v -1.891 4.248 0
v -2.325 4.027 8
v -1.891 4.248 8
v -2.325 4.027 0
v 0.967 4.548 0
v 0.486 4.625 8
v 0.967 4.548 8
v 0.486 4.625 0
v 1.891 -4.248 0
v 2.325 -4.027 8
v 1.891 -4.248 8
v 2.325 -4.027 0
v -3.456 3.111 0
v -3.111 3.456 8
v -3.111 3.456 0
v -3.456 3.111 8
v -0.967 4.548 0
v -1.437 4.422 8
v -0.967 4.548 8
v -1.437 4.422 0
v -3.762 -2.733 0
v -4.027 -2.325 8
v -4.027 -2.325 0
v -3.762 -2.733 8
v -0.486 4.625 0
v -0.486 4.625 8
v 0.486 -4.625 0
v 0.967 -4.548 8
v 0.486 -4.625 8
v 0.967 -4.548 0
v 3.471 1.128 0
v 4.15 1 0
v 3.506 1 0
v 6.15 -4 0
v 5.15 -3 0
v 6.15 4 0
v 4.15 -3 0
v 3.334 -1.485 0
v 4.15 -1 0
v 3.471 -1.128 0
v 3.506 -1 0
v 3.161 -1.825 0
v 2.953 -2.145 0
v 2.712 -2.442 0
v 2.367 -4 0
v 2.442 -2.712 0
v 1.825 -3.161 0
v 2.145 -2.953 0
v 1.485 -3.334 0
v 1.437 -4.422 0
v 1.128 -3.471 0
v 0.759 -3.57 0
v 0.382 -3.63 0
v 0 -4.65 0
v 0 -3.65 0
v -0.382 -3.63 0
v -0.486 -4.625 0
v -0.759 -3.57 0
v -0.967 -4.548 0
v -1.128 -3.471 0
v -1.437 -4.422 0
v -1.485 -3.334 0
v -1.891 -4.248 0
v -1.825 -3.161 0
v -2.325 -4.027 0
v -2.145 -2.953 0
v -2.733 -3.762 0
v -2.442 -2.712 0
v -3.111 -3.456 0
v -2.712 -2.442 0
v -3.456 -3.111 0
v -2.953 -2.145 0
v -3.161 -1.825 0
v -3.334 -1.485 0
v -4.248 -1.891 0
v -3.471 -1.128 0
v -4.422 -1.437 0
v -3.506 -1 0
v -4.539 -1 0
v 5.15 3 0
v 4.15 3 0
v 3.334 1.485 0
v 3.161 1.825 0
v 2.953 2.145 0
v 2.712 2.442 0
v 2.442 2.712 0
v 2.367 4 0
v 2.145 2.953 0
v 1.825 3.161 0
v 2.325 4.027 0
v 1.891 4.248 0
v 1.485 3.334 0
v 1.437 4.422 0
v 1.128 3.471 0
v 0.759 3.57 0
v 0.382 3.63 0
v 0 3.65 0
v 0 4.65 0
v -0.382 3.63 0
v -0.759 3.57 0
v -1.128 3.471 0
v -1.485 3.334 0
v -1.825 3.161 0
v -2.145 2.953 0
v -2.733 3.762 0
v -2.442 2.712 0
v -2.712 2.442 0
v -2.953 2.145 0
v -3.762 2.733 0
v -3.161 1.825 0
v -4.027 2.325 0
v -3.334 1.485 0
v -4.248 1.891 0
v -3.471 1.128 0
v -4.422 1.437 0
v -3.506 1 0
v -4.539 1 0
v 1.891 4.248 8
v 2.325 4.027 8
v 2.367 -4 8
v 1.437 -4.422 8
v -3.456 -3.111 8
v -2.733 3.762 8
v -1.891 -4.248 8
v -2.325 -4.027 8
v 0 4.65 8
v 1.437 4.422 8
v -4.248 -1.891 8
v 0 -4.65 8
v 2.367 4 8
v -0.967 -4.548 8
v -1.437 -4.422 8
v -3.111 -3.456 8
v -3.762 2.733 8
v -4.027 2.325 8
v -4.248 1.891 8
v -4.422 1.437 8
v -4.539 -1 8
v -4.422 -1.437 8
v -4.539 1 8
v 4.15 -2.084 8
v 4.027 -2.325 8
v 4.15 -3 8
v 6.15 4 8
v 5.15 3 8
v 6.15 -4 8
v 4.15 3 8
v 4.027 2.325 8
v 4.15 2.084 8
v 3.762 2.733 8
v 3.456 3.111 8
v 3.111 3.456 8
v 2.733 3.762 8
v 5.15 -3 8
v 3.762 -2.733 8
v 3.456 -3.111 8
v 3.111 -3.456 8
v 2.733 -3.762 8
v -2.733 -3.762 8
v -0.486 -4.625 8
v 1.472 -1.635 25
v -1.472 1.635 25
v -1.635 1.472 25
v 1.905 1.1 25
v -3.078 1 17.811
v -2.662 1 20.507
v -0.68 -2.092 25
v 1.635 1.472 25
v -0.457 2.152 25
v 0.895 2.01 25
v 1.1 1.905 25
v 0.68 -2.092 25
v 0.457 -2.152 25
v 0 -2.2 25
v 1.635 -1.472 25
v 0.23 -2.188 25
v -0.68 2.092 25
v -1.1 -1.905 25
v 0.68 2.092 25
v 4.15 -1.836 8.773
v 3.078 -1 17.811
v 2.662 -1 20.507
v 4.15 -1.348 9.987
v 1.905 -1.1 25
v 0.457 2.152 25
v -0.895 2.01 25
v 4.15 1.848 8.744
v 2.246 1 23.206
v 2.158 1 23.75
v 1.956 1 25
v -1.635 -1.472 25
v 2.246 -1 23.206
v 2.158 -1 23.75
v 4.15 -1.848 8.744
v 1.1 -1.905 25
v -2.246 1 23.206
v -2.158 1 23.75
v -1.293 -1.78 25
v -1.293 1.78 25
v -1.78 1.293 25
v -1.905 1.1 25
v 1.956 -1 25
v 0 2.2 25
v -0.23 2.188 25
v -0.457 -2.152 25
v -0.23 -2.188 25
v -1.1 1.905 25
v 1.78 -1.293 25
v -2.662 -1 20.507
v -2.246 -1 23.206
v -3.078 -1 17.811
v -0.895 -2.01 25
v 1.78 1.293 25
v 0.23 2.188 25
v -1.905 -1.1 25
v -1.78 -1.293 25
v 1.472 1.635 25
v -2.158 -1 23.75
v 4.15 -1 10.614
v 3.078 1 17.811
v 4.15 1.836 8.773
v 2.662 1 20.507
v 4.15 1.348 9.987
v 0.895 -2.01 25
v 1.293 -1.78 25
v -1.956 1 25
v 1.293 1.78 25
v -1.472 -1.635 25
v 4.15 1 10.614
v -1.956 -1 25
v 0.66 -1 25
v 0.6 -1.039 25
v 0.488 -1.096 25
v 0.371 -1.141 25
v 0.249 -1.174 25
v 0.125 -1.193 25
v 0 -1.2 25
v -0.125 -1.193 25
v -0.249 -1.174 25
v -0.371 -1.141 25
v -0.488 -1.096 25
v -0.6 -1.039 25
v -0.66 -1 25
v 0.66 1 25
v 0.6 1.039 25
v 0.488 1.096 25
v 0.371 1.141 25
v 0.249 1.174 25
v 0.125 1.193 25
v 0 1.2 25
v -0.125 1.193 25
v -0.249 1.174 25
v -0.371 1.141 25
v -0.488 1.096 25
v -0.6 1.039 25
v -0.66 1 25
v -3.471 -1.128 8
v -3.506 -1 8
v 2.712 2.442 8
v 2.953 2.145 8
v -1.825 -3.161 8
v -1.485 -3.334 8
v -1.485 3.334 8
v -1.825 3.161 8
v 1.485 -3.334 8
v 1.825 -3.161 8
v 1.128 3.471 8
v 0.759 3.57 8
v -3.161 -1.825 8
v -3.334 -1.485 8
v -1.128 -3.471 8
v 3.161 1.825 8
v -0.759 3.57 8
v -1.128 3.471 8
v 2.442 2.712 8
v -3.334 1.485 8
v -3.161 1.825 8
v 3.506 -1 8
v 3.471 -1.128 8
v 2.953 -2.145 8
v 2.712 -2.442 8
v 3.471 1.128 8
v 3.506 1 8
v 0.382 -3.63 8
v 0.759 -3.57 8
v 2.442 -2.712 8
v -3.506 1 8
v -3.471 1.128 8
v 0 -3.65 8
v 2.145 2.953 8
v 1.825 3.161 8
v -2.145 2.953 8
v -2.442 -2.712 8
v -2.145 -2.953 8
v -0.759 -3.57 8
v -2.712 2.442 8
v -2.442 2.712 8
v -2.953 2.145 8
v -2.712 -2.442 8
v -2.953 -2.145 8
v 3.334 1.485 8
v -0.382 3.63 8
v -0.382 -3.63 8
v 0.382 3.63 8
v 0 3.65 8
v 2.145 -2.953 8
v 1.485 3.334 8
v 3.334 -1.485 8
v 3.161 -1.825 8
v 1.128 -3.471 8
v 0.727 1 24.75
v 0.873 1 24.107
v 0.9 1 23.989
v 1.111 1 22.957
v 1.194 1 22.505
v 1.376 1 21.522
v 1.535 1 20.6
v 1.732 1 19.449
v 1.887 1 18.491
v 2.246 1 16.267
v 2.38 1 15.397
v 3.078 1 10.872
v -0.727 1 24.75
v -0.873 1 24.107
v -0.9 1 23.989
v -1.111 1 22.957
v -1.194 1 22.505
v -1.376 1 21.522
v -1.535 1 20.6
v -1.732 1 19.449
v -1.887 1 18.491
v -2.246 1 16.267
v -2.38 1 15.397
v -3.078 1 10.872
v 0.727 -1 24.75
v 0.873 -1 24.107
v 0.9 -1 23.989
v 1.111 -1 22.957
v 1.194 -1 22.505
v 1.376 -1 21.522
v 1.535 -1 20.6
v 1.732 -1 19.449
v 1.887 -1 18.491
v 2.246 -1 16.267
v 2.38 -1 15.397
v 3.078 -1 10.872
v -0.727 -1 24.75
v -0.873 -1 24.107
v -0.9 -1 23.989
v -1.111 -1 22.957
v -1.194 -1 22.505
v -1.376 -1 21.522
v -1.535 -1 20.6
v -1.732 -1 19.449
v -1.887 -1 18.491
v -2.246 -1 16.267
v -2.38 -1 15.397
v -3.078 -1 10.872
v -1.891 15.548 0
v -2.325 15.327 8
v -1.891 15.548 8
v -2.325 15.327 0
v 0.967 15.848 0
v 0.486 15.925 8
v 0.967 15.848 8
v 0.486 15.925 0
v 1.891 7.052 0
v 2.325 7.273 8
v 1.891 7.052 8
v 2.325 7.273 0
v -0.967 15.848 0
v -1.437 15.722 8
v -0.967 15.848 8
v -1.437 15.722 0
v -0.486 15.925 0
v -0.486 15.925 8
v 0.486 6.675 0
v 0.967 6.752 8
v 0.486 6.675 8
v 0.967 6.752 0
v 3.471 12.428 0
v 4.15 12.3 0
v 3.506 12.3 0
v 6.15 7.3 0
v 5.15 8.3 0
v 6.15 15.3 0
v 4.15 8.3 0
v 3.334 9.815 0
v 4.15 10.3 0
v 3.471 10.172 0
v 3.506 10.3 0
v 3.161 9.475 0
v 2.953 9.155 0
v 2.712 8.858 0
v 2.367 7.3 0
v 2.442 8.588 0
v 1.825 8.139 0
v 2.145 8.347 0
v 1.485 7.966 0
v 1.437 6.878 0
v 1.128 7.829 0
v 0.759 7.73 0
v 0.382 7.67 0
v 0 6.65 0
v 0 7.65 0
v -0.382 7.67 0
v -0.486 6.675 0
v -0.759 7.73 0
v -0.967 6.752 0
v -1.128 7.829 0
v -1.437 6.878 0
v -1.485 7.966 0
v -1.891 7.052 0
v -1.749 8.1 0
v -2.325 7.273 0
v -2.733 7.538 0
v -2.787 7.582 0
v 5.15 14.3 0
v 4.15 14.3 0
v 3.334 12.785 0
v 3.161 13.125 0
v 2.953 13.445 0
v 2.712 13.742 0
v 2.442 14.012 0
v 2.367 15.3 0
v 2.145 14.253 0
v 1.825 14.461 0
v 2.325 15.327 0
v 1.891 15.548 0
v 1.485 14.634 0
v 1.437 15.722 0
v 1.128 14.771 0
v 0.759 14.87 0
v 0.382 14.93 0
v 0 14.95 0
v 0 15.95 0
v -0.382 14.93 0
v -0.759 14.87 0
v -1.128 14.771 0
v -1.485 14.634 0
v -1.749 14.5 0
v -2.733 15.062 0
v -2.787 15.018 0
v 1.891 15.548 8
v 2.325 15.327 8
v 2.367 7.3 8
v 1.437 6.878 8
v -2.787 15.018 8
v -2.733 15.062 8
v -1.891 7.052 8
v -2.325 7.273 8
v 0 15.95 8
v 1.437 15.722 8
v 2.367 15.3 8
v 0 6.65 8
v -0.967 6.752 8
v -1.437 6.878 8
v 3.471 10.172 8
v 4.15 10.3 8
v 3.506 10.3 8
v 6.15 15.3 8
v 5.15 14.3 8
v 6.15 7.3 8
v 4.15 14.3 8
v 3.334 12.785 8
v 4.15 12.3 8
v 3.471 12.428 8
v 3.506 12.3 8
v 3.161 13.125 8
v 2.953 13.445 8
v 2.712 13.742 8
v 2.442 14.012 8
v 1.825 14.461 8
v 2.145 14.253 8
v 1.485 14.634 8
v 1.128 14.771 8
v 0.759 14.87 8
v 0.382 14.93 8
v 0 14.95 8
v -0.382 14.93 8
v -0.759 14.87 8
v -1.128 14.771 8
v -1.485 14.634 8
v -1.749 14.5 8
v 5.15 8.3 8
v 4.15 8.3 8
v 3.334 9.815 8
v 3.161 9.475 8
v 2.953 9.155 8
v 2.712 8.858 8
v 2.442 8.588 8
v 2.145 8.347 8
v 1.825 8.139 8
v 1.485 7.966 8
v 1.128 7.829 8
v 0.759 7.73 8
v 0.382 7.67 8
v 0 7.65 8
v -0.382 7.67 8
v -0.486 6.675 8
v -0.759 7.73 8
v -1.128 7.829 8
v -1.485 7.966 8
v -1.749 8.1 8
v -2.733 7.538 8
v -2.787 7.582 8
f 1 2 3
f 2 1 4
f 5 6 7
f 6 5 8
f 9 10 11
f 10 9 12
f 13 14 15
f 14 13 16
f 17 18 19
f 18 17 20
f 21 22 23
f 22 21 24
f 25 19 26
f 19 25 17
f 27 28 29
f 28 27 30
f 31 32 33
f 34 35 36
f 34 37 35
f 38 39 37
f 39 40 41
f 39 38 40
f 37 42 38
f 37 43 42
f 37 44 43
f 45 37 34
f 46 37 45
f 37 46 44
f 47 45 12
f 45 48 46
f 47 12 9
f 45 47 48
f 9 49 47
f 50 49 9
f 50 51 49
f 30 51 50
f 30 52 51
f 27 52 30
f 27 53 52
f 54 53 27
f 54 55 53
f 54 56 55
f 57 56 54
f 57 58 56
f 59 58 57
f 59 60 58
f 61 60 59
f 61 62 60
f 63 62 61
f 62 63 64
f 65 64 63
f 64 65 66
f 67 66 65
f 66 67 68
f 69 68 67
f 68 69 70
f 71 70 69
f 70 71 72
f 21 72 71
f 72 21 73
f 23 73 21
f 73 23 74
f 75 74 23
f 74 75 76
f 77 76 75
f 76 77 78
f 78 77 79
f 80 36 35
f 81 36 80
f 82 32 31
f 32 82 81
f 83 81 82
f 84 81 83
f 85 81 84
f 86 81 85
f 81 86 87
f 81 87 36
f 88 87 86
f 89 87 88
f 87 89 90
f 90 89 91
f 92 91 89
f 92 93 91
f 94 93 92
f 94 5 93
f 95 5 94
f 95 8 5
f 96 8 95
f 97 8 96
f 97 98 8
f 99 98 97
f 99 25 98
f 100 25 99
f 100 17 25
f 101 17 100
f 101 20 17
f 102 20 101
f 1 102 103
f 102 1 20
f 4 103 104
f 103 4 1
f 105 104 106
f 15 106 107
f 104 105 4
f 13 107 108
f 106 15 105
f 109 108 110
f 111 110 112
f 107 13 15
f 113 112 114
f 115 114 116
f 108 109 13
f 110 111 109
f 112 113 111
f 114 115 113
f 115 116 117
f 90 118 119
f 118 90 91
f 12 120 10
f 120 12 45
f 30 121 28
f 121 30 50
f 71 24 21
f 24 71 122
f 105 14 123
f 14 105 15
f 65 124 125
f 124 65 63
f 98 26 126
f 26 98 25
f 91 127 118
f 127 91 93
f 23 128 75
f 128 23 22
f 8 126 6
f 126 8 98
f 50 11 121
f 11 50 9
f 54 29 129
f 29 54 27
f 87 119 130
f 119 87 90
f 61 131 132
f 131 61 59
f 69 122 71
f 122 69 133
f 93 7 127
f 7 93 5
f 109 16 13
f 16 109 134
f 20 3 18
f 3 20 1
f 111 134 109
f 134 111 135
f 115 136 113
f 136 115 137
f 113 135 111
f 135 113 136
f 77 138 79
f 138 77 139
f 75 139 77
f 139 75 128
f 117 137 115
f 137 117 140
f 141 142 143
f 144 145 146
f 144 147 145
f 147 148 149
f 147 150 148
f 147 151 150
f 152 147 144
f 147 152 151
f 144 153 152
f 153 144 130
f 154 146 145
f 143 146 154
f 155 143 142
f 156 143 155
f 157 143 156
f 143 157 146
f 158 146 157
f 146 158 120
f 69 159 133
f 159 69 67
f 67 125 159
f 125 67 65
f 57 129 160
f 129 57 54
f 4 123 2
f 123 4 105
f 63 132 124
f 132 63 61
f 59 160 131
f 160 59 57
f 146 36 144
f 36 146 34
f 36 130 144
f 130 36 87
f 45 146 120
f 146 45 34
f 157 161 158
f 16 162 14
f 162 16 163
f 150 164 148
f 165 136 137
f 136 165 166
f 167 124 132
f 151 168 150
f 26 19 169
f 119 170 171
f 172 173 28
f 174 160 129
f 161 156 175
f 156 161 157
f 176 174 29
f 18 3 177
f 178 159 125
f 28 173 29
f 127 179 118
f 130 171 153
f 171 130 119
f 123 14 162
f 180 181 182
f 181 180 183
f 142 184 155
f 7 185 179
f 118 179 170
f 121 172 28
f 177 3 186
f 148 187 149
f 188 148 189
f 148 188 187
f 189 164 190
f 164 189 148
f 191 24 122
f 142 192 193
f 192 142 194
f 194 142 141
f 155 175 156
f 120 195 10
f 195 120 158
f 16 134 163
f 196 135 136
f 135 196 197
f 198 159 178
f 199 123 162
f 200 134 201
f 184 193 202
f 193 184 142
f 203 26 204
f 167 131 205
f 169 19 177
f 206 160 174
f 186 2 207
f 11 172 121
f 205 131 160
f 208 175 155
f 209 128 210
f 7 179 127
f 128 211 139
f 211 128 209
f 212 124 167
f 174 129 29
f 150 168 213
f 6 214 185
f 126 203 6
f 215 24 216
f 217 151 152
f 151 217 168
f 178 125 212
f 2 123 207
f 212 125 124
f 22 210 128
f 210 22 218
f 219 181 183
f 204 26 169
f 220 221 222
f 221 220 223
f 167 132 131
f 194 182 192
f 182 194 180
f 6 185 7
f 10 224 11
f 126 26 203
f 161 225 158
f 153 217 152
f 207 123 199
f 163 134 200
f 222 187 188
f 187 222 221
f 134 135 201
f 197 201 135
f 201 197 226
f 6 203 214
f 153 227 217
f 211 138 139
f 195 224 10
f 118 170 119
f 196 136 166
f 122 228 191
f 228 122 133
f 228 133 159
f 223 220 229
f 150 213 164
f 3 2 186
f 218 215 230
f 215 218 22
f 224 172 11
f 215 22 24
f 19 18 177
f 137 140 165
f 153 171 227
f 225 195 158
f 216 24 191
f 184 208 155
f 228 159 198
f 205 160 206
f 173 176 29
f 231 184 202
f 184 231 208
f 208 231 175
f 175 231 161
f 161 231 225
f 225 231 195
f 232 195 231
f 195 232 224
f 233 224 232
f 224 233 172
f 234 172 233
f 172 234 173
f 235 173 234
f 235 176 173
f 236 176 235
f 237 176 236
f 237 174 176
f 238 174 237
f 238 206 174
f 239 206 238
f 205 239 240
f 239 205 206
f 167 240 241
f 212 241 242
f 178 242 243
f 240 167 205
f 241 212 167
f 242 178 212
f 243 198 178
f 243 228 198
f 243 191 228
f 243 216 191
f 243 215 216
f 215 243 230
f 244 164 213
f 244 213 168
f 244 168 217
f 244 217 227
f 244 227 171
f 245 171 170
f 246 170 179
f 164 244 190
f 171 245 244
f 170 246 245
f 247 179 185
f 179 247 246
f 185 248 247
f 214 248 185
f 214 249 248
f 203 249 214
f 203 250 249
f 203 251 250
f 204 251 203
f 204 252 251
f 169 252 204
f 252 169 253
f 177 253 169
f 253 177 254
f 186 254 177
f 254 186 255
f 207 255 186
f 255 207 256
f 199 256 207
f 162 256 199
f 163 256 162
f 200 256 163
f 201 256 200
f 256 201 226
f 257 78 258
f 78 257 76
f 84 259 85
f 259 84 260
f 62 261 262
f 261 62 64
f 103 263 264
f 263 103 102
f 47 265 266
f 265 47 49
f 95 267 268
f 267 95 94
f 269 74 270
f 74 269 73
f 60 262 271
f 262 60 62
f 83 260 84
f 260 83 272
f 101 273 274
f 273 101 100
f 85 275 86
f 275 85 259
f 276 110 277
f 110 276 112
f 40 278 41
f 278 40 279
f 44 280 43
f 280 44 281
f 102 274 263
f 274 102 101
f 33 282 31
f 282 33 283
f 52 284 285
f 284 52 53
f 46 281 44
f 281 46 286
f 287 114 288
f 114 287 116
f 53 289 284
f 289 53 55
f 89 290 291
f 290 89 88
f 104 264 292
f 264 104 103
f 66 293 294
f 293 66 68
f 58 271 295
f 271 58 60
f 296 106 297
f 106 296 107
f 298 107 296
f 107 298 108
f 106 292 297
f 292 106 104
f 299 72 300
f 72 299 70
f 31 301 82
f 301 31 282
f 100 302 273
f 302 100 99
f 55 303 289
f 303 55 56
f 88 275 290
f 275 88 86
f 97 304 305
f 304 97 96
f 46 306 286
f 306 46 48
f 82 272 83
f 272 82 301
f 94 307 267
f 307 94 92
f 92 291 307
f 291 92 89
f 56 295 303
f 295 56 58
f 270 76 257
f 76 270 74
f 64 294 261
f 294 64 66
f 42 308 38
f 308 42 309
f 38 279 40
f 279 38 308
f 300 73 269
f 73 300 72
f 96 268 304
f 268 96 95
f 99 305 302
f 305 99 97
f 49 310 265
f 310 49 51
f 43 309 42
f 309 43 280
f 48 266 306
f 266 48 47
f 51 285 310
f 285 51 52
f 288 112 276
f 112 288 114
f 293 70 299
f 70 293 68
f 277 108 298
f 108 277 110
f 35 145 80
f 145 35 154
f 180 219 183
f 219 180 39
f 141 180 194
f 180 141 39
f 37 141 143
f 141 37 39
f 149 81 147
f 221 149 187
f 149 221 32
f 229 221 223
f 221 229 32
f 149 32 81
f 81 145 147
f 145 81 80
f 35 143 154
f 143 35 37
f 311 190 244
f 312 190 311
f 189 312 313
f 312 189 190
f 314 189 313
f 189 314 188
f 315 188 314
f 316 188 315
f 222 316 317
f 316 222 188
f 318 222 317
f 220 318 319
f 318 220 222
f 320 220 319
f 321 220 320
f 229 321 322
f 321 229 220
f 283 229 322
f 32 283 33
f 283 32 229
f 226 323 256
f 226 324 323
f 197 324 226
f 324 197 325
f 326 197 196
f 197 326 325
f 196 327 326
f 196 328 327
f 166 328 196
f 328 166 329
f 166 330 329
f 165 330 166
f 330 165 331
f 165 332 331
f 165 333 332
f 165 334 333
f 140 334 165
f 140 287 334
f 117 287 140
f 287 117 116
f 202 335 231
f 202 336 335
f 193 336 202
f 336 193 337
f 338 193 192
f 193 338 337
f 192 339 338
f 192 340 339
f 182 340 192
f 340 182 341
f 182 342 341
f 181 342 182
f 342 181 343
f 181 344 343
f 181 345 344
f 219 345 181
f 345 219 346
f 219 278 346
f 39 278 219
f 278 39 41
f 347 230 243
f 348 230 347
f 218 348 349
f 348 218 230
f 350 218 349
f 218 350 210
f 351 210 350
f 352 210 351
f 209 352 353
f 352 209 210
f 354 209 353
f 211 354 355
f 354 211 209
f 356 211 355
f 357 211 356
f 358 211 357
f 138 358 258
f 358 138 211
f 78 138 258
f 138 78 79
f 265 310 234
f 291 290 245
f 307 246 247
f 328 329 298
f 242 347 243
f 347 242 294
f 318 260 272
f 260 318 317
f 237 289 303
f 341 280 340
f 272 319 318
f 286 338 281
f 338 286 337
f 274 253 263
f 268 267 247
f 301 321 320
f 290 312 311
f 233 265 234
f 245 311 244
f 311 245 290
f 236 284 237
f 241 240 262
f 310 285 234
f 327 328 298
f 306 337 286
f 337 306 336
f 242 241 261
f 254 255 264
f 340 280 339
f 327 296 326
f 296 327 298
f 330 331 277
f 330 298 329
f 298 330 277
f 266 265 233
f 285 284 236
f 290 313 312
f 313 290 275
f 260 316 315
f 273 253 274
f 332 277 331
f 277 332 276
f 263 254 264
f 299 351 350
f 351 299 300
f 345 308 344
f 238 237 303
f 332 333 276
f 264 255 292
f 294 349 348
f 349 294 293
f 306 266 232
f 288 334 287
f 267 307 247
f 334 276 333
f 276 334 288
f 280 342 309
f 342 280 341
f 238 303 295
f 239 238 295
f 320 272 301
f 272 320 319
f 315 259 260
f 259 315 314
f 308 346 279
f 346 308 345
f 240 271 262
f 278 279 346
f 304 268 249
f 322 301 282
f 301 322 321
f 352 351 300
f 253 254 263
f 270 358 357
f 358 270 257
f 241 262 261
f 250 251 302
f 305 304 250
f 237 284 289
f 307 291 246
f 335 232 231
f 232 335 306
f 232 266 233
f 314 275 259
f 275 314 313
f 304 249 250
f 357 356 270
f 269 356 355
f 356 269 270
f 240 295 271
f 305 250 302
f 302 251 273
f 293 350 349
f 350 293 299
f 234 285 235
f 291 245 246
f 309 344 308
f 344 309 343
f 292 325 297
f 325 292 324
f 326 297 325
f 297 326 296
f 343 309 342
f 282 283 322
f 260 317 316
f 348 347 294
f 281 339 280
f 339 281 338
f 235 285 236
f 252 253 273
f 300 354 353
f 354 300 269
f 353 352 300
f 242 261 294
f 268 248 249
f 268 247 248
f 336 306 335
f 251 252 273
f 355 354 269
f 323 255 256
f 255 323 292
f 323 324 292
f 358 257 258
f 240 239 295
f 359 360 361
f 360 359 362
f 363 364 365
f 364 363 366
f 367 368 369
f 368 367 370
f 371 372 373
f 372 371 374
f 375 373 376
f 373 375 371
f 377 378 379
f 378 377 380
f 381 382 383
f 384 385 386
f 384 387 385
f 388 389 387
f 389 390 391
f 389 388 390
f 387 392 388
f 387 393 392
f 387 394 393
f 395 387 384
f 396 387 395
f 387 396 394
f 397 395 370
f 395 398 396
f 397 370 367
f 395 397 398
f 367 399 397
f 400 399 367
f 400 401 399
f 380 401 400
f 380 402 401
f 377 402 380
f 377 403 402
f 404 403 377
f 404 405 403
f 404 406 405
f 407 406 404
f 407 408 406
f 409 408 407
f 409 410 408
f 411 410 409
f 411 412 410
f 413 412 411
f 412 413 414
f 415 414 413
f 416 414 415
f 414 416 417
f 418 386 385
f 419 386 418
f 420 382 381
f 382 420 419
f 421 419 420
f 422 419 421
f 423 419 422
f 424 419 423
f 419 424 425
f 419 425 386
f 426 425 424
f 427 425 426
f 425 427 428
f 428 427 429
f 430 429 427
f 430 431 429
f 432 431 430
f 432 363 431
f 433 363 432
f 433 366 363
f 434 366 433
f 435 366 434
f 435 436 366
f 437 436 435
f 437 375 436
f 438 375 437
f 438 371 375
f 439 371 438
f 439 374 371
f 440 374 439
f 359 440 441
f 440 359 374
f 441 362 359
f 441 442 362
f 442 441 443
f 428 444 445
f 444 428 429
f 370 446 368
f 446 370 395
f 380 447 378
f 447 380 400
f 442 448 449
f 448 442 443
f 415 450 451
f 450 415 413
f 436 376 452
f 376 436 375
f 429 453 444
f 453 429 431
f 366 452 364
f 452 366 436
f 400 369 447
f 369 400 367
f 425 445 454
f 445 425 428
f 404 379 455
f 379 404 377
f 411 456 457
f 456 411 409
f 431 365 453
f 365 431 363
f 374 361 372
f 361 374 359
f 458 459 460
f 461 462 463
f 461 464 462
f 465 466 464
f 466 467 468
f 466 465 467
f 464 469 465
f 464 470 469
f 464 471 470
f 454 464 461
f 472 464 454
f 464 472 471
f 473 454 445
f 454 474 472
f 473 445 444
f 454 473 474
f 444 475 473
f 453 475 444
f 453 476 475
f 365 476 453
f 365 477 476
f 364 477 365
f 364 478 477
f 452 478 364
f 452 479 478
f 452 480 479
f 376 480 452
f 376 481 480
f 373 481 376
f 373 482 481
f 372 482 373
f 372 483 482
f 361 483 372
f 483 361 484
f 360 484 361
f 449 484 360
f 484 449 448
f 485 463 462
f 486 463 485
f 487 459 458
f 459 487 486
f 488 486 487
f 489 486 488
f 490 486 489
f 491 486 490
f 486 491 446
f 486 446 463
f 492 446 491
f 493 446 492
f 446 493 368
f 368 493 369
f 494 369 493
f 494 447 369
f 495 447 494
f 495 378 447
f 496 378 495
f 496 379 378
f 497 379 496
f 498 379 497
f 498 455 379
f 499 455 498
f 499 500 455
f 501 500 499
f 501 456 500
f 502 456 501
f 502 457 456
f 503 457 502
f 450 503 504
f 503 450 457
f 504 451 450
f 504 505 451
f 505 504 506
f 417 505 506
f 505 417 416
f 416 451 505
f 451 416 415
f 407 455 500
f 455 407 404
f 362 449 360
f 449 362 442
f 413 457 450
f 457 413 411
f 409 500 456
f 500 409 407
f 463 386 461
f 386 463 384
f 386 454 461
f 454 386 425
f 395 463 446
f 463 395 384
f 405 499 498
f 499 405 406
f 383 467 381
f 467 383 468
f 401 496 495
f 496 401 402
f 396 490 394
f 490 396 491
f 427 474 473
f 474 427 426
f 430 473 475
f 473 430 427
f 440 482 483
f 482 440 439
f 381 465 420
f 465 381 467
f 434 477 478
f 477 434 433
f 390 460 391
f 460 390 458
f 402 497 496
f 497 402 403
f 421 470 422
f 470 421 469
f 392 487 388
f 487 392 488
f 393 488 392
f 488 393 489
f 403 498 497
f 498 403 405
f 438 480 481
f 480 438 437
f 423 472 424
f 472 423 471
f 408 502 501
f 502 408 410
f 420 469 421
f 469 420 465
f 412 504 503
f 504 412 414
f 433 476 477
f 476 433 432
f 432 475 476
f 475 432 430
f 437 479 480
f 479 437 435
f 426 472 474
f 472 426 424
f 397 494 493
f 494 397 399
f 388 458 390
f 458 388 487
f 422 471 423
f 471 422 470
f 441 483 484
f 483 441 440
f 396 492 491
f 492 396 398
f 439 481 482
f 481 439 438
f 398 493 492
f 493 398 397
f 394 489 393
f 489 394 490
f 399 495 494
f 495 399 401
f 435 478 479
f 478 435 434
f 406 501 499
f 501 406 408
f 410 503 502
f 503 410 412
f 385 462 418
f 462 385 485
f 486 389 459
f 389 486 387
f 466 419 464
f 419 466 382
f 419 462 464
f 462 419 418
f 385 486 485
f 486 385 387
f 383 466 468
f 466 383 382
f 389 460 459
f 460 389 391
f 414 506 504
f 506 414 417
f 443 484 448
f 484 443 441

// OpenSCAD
// pencil clip & protector for notebook with band closure
// version 0.2.0
// by pixelhaufen
// is licensed under CC BY-SA 3.0 -> https://creativecommons.org/licenses/by-sa/3.0/

//------------------------------------------------------------------
// User Inputs

/*[(elastic) band]*/
elastic_band_width = 6; // [4:0.1:15]
elastic_band_height = 1; // [0.5:0.1:2]

/*[pencil]*/
pencil_diameter = 7.3; // [5:0.1:15]
pencil_tip_height = 16; // [10:25]

/*[clips]*/
top_clip = "yes"; // [yes,no]
second_clip = "yes"; // [yes,no]
second_clip_pull = "no"; // [yes,no]

/*[Hidden]*/
// speed vs. resolution
$fn = 60; // looks like this can't be modified on thingiverse

pencil_inner_radius = pencil_diameter/2;
pencil_outer_radius = pencil_inner_radius + 1;
pencil_clip_tip_height = pencil_tip_height + 1;
clip_connector_height = 8;

//------------------------------------------------------------------
// Main

if(top_clip=="yes")
{
    clip(true);
    
    if(second_clip=="yes")
    {
        if((elastic_band_width+2) > (pencil_outer_radius*2+2))
        {
            translate([0,elastic_band_width+4,0])
            {
                clip(false);
            }
        }
        else
        {
            translate([0,pencil_outer_radius*2+2,0])
            {
                clip(false);
            }
        }
    }
}
else
{
    if(second_clip=="yes")
    {
        clip(false);
    }
}

//------------------------------------------------------------------
// Module

module clip(top)
{
    difference()
    {
        // shell
        union()
        {
            cylinder(h=clip_connector_height, r1=pencil_outer_radius, r2=pencil_outer_radius, center=false);
            translate([0,(elastic_band_width/-2)-1,0])
            {
                cube([pencil_outer_radius+elastic_band_height+0.5,elastic_band_width+2,clip_connector_height],center=false);
            }
            
            if(top)
            {
                translate([0,0,clip_connector_height])
                {
                    cylinder(h=pencil_clip_tip_height, r1=pencil_outer_radius, r2=2.2, center=false);
                }
            }
        }
        
        // remove inner
        union()
        {
            cylinder(h=clip_connector_height, r1=pencil_inner_radius, r2=pencil_inner_radius, center=false);
            translate([pencil_inner_radius+0.5,elastic_band_width/-2,0])
            {
                cube([elastic_band_height,elastic_band_width,clip_connector_height+pencil_clip_tip_height],center=false);
            }
            
            translate([pencil_outer_radius*-1,elastic_band_height*-1,0])
            {
                cube([pencil_outer_radius*2,elastic_band_height*2,clip_connector_height+pencil_clip_tip_height],center=false);
            }
            
            if(top)
            {
                translate([0,0,clip_connector_height])
                {
                    cylinder(h=pencil_clip_tip_height, r1=pencil_inner_radius, r2=1.2, center=false);
                }
            }
            else if(second_clip_pull == "no")
            {
                linear_extrude(height = clip_connector_height+pencil_clip_tip_height, twist = 0)
                {
                    polygon(points=[[pencil_outer_radius,0], [pencil_outer_radius*-1,pencil_outer_radius], [pencil_outer_radius*-1,pencil_outer_radius*-1]]);
                }
            }
            
        }
    }
}
